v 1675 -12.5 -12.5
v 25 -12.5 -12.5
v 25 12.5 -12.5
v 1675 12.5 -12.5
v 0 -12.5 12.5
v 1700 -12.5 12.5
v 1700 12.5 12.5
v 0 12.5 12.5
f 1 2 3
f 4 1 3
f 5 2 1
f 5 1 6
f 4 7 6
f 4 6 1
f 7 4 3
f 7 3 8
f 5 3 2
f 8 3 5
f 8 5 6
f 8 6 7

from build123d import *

# Parameters (mm, degrees)
F0_W          = 25
F0_H          = 25
F1_DEPTH      = 1700
F3_DEPTH      = 12.501
F3_DEPTH_BACK = 12.501
F5_DEPTH      = 12.501
F5_DEPTH_BACK = 12.501


with BuildPart() as f1:
    # F0 (on Right) → F1 (new body)
    with BuildSketch(Plane.YZ):
        Rectangle(F0_W, F0_H)
    extrude(amount=F1_DEPTH)

    # F2 (on Front) → F3 (cut, two sides)
    with BuildSketch(Plane.XZ) as f3_sk:
        Polygon((25, -12.5), (0, 12.5), (0, -12.5), align=None)
    extrude(amount=-F3_DEPTH, mode=Mode.SUBTRACT)
    extrude(f3_sk.sketch, amount=F3_DEPTH_BACK, mode=Mode.SUBTRACT)

    # F4 (on Front) → F5 (cut, two sides)
    with BuildSketch(Plane.XZ) as f5_sk:
        Polygon((1700, -12.5), (1700, 12.5), (1675, -12.5), align=None)
    extrude(amount=-F5_DEPTH, mode=Mode.SUBTRACT)
    extrude(f5_sk.sketch, amount=F5_DEPTH_BACK, mode=Mode.SUBTRACT)


solid = f1.part
